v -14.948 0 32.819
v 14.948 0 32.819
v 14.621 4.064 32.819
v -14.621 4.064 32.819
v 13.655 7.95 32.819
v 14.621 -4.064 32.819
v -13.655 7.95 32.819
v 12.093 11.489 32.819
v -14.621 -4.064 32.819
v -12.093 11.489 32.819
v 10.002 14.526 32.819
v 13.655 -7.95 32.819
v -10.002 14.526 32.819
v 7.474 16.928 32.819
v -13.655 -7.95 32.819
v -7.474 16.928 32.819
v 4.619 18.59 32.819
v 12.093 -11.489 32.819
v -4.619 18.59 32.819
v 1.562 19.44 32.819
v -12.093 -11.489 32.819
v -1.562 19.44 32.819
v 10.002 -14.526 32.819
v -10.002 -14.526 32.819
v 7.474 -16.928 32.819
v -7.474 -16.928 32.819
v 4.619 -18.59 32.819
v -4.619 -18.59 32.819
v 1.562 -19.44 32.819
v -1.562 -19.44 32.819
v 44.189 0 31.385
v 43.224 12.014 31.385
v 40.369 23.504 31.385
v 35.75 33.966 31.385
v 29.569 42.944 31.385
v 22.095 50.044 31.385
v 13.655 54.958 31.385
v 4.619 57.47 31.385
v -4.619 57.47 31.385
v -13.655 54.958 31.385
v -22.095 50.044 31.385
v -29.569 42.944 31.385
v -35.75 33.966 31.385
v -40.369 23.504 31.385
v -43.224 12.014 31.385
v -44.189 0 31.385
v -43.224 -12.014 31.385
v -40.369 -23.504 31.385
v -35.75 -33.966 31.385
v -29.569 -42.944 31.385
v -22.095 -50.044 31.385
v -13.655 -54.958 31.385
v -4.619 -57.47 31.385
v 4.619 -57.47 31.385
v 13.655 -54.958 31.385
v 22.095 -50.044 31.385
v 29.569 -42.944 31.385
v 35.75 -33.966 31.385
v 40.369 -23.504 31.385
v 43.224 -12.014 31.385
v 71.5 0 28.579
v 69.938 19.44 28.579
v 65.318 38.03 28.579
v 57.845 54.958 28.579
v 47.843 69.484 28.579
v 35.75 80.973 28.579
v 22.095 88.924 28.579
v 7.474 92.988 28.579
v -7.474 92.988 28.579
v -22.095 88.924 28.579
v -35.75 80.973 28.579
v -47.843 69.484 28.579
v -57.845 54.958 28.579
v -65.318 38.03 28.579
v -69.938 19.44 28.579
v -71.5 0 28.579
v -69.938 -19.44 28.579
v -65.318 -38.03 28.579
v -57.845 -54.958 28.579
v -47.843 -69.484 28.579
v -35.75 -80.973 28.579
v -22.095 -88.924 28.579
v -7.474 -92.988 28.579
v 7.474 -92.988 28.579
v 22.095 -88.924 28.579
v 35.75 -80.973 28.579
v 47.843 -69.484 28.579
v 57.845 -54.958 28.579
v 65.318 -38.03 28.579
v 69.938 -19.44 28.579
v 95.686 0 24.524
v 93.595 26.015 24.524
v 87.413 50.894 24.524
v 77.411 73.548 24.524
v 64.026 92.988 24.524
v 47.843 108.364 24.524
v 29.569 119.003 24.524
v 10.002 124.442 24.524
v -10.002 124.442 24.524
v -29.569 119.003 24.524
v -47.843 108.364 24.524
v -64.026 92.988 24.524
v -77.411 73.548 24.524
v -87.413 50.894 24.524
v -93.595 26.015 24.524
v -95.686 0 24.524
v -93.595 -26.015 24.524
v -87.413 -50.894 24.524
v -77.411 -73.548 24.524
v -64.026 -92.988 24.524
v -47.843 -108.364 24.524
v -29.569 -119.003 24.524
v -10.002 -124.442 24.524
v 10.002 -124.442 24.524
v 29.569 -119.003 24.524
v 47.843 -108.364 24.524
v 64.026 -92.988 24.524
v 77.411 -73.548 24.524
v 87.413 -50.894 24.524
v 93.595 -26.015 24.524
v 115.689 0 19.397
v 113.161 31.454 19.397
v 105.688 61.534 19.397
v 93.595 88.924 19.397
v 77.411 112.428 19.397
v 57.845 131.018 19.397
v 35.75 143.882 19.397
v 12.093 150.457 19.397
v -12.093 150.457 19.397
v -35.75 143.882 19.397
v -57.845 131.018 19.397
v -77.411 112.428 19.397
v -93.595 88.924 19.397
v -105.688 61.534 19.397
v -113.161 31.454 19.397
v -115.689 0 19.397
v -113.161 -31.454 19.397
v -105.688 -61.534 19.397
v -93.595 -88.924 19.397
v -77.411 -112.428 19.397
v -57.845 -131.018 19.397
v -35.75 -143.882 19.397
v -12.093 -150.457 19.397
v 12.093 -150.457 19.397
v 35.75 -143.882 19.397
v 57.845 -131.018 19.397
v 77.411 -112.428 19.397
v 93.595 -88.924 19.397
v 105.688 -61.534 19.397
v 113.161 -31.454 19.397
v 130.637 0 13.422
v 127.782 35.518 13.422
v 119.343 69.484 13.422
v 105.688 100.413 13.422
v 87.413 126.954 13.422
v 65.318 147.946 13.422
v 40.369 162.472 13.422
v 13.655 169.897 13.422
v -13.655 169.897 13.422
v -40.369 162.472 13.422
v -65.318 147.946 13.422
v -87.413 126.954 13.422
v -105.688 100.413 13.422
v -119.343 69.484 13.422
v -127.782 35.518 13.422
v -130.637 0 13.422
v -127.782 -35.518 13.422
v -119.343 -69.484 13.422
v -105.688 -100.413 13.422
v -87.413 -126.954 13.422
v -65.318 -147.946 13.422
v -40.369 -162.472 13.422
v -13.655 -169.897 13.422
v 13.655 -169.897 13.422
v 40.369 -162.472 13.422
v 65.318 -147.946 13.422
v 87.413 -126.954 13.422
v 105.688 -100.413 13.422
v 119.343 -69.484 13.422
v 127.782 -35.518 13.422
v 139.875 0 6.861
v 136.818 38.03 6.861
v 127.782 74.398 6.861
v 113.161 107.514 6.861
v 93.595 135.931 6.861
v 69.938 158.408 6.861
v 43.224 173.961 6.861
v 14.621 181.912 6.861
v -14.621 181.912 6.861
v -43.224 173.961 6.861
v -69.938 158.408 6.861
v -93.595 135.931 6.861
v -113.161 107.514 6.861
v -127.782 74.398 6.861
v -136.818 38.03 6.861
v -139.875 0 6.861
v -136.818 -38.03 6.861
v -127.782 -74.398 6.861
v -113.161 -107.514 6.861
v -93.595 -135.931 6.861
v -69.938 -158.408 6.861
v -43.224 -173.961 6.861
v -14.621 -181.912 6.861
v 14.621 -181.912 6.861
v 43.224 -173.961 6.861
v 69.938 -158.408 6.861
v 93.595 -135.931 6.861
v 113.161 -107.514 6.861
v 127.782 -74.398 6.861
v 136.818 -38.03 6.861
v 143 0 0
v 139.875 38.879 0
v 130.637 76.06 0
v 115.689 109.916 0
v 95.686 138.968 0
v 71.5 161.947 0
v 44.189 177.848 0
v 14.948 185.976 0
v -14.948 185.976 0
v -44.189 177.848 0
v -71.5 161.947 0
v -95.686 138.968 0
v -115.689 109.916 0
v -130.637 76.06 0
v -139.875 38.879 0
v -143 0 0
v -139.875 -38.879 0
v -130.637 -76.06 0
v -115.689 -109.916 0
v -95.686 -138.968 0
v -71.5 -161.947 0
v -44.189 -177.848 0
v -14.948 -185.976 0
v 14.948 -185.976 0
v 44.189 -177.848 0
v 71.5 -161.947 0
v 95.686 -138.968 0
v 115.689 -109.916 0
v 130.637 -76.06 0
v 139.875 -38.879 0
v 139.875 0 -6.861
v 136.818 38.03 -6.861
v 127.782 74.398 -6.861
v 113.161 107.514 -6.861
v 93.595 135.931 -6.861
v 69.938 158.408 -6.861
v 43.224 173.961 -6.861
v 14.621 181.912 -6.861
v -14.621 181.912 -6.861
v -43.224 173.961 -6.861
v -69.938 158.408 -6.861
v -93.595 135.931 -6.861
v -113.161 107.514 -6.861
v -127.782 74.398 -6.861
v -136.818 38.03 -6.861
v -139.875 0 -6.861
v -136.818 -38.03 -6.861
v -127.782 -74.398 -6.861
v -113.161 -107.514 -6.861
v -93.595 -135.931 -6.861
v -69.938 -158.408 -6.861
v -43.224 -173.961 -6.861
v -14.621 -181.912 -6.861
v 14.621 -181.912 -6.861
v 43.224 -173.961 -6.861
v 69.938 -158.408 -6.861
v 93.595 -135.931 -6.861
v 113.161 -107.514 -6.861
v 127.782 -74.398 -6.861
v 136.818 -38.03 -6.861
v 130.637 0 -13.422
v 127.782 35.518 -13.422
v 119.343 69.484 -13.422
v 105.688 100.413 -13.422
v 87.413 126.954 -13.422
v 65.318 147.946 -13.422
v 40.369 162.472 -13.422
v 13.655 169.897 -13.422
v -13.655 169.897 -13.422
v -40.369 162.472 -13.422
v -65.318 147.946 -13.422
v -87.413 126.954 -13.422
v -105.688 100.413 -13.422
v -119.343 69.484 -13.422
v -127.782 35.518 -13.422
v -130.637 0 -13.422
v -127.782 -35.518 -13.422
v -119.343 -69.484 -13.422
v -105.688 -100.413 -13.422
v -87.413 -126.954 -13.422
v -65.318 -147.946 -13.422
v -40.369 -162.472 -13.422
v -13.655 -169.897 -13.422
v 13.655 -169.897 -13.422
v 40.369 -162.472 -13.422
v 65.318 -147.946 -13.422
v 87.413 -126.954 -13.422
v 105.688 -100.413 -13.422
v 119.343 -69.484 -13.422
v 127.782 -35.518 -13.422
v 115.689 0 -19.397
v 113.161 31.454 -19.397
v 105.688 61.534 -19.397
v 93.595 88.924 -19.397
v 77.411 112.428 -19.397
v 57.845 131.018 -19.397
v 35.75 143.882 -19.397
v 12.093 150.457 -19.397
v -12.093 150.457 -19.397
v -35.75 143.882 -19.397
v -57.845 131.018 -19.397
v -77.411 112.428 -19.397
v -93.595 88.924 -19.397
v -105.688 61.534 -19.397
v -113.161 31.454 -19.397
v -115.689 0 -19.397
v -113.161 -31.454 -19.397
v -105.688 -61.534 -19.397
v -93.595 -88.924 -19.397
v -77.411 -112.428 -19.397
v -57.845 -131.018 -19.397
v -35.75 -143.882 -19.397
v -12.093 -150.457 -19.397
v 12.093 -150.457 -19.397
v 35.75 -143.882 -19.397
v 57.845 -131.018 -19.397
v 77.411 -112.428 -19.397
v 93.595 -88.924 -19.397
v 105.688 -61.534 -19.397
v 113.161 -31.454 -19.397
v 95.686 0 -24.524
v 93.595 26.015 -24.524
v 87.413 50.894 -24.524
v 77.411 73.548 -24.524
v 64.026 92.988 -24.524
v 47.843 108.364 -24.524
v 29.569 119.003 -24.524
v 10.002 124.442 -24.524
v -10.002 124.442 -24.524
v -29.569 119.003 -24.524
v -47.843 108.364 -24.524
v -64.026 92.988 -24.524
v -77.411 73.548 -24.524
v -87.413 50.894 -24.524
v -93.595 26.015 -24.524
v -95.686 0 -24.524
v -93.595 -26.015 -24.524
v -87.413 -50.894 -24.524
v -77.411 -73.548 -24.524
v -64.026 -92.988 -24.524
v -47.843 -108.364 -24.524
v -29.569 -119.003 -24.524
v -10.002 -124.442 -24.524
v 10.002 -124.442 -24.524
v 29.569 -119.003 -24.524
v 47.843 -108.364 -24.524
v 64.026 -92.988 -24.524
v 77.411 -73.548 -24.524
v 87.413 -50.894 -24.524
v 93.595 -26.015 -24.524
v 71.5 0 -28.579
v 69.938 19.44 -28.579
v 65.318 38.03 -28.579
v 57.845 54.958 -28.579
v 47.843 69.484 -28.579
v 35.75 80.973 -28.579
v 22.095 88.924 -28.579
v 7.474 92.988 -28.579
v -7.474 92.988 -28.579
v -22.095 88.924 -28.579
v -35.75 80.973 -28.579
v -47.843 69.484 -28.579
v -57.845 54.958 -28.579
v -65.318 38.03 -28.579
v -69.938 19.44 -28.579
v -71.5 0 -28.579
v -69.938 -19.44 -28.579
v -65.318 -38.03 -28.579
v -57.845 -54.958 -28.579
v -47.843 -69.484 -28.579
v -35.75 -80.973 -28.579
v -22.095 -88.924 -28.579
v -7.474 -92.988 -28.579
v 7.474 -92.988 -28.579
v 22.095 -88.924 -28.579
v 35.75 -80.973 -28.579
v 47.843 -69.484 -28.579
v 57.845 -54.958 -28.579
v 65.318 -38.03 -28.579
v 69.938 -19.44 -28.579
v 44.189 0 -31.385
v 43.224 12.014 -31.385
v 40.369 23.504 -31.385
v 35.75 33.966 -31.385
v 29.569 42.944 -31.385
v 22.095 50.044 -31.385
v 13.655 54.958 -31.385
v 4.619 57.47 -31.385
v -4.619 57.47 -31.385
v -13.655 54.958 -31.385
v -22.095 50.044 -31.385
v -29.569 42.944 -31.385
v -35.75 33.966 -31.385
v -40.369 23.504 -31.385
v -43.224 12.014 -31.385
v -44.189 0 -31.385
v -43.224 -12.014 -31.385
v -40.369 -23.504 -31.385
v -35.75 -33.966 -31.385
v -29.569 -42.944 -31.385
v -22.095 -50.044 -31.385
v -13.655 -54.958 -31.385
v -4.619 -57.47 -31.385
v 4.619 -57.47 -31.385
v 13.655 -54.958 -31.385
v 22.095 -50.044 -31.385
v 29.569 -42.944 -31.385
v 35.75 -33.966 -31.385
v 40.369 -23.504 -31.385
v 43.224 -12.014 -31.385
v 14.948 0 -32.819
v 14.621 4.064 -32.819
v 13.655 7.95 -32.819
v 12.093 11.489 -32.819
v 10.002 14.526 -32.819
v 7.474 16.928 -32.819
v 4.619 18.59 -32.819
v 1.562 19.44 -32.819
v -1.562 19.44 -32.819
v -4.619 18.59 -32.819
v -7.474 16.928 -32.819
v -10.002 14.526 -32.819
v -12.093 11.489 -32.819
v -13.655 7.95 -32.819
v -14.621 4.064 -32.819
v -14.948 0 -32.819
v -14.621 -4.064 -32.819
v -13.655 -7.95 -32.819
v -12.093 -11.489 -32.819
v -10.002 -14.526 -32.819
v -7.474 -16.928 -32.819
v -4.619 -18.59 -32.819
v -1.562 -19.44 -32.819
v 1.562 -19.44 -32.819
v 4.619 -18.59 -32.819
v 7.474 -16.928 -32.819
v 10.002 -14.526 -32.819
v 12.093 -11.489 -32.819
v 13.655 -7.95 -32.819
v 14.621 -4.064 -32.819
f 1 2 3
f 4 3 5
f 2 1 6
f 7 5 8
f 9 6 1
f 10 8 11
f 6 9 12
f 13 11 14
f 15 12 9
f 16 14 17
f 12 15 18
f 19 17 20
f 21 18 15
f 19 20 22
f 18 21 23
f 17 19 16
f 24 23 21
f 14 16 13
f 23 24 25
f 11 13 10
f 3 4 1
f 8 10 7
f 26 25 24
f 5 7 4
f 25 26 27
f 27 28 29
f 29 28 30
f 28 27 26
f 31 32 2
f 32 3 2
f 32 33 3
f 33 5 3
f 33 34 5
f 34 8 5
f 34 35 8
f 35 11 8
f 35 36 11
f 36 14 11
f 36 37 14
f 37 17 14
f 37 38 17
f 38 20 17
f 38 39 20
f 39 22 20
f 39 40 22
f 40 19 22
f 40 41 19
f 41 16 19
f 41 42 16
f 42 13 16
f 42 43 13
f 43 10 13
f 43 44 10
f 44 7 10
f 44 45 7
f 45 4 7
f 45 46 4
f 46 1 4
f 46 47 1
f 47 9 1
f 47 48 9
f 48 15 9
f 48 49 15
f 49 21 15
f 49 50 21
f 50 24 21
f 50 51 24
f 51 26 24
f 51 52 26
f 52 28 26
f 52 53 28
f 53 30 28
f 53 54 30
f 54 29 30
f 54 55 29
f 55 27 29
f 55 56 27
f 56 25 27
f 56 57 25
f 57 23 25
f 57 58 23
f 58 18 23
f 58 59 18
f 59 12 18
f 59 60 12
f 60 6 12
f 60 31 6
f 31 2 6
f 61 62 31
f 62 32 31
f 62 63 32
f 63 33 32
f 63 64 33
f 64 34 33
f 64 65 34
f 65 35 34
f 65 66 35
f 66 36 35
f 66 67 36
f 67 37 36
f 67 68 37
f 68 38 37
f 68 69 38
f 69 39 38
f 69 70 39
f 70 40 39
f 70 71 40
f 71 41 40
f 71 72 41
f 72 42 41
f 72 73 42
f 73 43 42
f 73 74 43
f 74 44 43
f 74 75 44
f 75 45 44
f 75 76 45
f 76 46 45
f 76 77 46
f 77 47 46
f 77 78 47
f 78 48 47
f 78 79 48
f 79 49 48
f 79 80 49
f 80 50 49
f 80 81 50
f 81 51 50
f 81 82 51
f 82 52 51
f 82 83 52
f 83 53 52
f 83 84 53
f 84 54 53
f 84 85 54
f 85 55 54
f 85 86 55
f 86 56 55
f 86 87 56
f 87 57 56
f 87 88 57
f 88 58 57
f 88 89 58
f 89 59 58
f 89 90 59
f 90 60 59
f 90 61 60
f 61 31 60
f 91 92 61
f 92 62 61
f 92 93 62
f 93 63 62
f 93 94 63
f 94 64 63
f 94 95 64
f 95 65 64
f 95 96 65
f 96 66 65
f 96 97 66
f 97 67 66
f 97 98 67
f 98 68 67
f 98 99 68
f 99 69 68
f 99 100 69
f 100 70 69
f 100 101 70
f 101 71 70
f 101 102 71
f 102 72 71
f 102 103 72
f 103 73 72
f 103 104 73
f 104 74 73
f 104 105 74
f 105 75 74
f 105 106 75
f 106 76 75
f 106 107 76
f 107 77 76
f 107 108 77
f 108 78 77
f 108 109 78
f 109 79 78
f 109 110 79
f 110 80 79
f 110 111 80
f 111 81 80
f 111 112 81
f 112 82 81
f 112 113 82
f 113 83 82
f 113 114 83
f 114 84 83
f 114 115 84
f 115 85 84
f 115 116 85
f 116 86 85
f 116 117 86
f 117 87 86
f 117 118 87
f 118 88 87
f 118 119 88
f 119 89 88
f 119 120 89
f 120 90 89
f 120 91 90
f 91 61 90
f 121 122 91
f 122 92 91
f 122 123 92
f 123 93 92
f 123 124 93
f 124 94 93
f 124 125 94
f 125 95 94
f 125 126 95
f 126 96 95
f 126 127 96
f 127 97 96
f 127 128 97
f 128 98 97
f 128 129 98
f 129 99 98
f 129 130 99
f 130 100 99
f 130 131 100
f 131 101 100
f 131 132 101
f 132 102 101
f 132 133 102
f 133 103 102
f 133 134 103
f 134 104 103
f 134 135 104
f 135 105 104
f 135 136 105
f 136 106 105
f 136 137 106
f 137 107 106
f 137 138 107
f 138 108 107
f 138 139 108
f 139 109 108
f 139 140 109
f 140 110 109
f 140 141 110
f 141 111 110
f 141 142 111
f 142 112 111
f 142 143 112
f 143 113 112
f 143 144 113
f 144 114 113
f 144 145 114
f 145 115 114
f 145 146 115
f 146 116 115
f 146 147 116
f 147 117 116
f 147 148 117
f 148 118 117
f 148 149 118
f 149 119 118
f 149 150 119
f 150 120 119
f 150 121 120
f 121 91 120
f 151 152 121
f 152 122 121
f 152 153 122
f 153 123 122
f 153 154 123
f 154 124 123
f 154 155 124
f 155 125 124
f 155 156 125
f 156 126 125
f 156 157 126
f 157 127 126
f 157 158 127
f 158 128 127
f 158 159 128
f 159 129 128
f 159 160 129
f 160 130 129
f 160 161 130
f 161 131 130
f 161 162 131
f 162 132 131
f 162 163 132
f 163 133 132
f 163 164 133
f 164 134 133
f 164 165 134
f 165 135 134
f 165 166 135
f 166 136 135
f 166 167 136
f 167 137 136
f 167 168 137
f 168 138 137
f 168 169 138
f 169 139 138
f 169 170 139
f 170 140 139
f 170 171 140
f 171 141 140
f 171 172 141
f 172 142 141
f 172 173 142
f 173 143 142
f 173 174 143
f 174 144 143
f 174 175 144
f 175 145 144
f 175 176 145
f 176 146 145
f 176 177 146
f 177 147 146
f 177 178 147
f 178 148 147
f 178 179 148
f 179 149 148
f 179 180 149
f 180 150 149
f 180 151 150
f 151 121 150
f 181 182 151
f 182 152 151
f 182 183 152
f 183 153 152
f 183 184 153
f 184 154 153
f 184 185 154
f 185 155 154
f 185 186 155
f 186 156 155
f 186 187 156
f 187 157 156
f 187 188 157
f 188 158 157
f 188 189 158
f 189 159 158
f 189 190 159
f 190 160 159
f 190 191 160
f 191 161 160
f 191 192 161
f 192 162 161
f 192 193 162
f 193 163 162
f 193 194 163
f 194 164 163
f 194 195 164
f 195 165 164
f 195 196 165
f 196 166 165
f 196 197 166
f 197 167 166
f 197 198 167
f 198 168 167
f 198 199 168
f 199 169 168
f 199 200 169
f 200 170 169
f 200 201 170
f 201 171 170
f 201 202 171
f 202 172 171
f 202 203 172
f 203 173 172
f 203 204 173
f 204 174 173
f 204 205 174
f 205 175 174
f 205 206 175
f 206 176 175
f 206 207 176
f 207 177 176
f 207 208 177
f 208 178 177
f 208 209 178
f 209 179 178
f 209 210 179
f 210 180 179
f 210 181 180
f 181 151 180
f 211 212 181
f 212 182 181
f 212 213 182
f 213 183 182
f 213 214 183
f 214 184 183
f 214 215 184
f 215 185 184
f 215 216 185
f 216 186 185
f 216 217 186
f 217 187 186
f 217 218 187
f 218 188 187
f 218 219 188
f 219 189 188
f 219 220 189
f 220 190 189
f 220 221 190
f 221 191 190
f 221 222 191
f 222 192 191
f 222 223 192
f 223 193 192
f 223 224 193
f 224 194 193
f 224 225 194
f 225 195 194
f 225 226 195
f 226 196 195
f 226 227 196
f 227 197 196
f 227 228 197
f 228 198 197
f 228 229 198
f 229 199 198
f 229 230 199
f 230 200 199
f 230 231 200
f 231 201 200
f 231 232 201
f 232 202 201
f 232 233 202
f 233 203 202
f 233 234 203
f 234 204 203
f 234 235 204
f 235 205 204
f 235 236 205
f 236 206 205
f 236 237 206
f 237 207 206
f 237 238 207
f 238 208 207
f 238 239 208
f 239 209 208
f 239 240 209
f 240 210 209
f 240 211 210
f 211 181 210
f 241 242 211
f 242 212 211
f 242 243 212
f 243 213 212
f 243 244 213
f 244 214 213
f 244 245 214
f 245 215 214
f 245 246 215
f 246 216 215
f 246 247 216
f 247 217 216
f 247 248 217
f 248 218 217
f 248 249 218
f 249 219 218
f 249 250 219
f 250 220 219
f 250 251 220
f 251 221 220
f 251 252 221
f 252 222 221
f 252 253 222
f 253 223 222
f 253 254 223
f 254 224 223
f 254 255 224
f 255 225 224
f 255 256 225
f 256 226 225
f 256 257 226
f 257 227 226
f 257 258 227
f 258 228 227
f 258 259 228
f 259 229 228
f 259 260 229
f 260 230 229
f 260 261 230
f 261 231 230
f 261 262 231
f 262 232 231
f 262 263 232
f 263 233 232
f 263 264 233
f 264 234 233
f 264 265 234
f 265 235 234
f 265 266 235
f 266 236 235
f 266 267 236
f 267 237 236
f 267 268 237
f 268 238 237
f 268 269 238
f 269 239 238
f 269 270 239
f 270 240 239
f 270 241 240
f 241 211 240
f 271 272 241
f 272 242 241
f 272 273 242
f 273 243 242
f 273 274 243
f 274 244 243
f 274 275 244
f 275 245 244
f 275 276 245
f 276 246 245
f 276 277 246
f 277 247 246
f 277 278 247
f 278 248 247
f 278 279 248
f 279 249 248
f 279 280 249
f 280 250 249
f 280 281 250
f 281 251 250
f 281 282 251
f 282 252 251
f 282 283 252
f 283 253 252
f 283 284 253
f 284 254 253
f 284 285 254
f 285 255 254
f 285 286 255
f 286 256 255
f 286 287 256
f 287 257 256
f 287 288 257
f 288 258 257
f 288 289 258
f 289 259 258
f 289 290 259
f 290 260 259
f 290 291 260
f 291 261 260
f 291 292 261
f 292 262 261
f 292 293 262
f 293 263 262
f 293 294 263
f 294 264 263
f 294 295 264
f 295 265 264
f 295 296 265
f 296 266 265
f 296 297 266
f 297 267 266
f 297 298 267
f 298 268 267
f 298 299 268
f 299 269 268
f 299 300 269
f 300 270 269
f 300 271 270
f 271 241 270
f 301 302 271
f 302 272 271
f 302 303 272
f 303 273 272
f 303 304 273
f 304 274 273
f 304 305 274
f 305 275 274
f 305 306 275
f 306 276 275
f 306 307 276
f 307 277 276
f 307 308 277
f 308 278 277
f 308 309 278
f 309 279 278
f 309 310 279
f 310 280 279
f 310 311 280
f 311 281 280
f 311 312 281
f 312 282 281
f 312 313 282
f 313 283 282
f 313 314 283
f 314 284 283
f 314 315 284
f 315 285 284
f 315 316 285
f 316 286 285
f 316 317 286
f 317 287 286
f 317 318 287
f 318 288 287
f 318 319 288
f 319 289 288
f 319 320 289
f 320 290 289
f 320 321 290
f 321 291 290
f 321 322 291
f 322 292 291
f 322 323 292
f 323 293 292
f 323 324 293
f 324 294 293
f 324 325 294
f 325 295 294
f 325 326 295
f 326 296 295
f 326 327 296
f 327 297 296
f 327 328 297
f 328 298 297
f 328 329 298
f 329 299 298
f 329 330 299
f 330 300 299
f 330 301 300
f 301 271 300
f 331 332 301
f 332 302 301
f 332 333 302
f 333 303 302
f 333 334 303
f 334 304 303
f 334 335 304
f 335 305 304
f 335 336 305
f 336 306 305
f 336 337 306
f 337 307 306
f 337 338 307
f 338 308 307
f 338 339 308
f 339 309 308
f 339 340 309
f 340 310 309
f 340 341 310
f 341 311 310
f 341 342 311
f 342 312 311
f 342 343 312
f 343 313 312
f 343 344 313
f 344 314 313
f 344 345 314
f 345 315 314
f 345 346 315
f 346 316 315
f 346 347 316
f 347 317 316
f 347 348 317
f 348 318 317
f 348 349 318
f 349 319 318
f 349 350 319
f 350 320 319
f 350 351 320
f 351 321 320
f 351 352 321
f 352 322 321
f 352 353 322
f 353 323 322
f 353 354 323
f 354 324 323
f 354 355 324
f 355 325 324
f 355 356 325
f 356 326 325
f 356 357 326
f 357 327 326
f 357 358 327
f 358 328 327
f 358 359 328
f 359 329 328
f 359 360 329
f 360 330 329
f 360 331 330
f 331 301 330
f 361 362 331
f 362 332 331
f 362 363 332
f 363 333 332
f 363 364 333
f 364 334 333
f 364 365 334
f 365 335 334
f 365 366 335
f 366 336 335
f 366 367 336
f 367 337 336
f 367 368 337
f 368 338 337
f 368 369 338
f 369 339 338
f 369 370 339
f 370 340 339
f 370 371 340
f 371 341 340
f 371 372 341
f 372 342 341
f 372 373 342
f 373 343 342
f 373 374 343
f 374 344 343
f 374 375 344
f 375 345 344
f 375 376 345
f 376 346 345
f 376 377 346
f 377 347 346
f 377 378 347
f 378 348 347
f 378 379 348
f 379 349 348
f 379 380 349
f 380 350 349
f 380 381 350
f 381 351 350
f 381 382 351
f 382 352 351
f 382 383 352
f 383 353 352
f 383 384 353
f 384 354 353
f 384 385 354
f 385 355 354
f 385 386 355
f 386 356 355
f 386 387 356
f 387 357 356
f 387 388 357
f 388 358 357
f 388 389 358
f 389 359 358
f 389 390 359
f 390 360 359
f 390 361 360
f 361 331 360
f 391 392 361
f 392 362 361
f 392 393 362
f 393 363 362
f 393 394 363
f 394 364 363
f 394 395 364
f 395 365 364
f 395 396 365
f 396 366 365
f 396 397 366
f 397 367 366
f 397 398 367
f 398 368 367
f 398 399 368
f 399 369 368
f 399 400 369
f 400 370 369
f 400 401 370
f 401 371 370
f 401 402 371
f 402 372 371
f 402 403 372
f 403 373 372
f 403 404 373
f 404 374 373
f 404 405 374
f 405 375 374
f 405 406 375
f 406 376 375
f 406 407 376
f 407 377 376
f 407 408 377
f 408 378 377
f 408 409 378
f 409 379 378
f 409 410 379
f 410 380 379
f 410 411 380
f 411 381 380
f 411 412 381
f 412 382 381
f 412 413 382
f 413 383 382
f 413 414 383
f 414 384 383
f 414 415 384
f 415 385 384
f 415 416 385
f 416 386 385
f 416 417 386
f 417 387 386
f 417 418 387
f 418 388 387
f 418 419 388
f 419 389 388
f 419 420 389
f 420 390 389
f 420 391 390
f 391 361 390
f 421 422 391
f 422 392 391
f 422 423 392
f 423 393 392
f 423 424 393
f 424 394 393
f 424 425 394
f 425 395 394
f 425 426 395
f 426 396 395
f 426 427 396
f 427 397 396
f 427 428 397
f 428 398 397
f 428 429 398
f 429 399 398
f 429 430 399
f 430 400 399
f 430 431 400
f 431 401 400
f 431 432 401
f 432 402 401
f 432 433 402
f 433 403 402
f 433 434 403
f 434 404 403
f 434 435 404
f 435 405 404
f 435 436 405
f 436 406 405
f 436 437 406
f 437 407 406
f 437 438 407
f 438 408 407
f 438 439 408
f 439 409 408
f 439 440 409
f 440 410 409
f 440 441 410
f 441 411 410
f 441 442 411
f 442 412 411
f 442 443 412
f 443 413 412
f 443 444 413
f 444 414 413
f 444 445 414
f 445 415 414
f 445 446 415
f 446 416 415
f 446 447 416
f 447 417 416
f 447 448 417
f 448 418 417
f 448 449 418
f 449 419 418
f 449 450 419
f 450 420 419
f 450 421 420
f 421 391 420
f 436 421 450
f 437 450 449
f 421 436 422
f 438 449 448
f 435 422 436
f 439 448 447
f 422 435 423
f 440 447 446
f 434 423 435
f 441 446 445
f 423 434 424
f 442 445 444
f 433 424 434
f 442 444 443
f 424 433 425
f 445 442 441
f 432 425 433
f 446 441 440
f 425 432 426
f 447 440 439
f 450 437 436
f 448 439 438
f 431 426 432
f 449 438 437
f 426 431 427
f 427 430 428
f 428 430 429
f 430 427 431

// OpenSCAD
// Generated by SolidPython 1.0.1 on 2020-07-29 00:46:51


scale(v = [13, 17, 3]) {
	sphere(r = 11);
}
/***********************************************
*********      SolidPython code:      **********
************************************************
 
# import packages: SolidPython
from solid import *
from solid.utils import *
from itertools import chain, combinations, permutations


class Resize:

    def __init__(self, scad_file):
        self.scad_file = scad_file
        #self.scad_file = import_scad(scad_file)
        # cone/cylinder param:
        self.r1 = 0
        self.r2 = 0
        self.h = 0
        # rectangular prism param:
        self.w = 0
        self.l = 0
        # ellipse param:
        self.r = 0

    # import OpenScad code (file name corresponds to shape)


    # classify shape + parameters
    def assign(self, param1, param2, param3):
        if self.scad_file == 'cone.scad':
            self.r1 = param1
            self.r2 = param2
            self.h = param3
        elif self.scad_file == 'cylinder.scad':
            self.r1 = param1
            self.r2 = param2
            self.h = param3
        elif self.scad_file == 'rectangularPrism.scad':
            self.h = param1
            self.l = param2
            self.w = param3
        else:
            self.r = param1
            self.h = param2

    # resize parameters
    def iterate(self):
        x = range(3, 20, 2)
        i = 1
        if self.scad_file == 'cone.scad':
            tempList = list(permutations(x, 2))
            for temp in tempList:
                param1 = temp[0]
                param2 = temp[1]
                filepath = 'produced_scad_files/' + 'cone' + str(param1) + '_' + str(param2) + '_' + '.scad'
                scad_render_to_file(cylinder(h=param1, r1=param2, r2=0), filepath)

        elif self.scad_file == 'cylinder.scad':
            tempList = list(permutations(x, 3))
            for temp in tempList:
                param1 = temp[0]
                param2 = temp[1]
                filepath = 'produced_scad_files/' + 'cylinder' + str(param1) + '_' + str(param2) + '_' + '.scad'
                scad_render_to_file(cylinder(h=param1, r1=param2, r2=param2), filepath)

        elif self.scad_file == 'rectangularPrism.scad':
            tempList = list(permutations(x, 3))
            for temp in tempList:
                param1 = temp[0]
                param2 = temp[1]
                param3 = temp[2]
                filepath = 'produced_scad_files/' + 'rectangularPrism' + str(param1) + '_' + str(param2) + '_' + str(
                    param3) + '.scad'
                scad_render_to_file(cube(size=(param1, param2, param3)), filepath)

        elif self.scad_file == 'ellipse.scad':
            tempList = list(permutations(x, 4))
            for temp in tempList:
                param1 = temp[0]
                param2 = temp[1]
                param3 = temp[2]
                param4 = temp[3]
                filepath = 'produced_scad_files/' + 'ellipse' + str(param1) + '_' + str(param2) + '_' + str(param3) + '_' + str(param4) + '.scad'
                scad_render_to_file(scale([param1, param2, param3])(sphere(r=param4)), filepath)

    def render_to_scadfile(self):
        scad_render_to_file(scad, 'example.scad') 
 
************************************************/
